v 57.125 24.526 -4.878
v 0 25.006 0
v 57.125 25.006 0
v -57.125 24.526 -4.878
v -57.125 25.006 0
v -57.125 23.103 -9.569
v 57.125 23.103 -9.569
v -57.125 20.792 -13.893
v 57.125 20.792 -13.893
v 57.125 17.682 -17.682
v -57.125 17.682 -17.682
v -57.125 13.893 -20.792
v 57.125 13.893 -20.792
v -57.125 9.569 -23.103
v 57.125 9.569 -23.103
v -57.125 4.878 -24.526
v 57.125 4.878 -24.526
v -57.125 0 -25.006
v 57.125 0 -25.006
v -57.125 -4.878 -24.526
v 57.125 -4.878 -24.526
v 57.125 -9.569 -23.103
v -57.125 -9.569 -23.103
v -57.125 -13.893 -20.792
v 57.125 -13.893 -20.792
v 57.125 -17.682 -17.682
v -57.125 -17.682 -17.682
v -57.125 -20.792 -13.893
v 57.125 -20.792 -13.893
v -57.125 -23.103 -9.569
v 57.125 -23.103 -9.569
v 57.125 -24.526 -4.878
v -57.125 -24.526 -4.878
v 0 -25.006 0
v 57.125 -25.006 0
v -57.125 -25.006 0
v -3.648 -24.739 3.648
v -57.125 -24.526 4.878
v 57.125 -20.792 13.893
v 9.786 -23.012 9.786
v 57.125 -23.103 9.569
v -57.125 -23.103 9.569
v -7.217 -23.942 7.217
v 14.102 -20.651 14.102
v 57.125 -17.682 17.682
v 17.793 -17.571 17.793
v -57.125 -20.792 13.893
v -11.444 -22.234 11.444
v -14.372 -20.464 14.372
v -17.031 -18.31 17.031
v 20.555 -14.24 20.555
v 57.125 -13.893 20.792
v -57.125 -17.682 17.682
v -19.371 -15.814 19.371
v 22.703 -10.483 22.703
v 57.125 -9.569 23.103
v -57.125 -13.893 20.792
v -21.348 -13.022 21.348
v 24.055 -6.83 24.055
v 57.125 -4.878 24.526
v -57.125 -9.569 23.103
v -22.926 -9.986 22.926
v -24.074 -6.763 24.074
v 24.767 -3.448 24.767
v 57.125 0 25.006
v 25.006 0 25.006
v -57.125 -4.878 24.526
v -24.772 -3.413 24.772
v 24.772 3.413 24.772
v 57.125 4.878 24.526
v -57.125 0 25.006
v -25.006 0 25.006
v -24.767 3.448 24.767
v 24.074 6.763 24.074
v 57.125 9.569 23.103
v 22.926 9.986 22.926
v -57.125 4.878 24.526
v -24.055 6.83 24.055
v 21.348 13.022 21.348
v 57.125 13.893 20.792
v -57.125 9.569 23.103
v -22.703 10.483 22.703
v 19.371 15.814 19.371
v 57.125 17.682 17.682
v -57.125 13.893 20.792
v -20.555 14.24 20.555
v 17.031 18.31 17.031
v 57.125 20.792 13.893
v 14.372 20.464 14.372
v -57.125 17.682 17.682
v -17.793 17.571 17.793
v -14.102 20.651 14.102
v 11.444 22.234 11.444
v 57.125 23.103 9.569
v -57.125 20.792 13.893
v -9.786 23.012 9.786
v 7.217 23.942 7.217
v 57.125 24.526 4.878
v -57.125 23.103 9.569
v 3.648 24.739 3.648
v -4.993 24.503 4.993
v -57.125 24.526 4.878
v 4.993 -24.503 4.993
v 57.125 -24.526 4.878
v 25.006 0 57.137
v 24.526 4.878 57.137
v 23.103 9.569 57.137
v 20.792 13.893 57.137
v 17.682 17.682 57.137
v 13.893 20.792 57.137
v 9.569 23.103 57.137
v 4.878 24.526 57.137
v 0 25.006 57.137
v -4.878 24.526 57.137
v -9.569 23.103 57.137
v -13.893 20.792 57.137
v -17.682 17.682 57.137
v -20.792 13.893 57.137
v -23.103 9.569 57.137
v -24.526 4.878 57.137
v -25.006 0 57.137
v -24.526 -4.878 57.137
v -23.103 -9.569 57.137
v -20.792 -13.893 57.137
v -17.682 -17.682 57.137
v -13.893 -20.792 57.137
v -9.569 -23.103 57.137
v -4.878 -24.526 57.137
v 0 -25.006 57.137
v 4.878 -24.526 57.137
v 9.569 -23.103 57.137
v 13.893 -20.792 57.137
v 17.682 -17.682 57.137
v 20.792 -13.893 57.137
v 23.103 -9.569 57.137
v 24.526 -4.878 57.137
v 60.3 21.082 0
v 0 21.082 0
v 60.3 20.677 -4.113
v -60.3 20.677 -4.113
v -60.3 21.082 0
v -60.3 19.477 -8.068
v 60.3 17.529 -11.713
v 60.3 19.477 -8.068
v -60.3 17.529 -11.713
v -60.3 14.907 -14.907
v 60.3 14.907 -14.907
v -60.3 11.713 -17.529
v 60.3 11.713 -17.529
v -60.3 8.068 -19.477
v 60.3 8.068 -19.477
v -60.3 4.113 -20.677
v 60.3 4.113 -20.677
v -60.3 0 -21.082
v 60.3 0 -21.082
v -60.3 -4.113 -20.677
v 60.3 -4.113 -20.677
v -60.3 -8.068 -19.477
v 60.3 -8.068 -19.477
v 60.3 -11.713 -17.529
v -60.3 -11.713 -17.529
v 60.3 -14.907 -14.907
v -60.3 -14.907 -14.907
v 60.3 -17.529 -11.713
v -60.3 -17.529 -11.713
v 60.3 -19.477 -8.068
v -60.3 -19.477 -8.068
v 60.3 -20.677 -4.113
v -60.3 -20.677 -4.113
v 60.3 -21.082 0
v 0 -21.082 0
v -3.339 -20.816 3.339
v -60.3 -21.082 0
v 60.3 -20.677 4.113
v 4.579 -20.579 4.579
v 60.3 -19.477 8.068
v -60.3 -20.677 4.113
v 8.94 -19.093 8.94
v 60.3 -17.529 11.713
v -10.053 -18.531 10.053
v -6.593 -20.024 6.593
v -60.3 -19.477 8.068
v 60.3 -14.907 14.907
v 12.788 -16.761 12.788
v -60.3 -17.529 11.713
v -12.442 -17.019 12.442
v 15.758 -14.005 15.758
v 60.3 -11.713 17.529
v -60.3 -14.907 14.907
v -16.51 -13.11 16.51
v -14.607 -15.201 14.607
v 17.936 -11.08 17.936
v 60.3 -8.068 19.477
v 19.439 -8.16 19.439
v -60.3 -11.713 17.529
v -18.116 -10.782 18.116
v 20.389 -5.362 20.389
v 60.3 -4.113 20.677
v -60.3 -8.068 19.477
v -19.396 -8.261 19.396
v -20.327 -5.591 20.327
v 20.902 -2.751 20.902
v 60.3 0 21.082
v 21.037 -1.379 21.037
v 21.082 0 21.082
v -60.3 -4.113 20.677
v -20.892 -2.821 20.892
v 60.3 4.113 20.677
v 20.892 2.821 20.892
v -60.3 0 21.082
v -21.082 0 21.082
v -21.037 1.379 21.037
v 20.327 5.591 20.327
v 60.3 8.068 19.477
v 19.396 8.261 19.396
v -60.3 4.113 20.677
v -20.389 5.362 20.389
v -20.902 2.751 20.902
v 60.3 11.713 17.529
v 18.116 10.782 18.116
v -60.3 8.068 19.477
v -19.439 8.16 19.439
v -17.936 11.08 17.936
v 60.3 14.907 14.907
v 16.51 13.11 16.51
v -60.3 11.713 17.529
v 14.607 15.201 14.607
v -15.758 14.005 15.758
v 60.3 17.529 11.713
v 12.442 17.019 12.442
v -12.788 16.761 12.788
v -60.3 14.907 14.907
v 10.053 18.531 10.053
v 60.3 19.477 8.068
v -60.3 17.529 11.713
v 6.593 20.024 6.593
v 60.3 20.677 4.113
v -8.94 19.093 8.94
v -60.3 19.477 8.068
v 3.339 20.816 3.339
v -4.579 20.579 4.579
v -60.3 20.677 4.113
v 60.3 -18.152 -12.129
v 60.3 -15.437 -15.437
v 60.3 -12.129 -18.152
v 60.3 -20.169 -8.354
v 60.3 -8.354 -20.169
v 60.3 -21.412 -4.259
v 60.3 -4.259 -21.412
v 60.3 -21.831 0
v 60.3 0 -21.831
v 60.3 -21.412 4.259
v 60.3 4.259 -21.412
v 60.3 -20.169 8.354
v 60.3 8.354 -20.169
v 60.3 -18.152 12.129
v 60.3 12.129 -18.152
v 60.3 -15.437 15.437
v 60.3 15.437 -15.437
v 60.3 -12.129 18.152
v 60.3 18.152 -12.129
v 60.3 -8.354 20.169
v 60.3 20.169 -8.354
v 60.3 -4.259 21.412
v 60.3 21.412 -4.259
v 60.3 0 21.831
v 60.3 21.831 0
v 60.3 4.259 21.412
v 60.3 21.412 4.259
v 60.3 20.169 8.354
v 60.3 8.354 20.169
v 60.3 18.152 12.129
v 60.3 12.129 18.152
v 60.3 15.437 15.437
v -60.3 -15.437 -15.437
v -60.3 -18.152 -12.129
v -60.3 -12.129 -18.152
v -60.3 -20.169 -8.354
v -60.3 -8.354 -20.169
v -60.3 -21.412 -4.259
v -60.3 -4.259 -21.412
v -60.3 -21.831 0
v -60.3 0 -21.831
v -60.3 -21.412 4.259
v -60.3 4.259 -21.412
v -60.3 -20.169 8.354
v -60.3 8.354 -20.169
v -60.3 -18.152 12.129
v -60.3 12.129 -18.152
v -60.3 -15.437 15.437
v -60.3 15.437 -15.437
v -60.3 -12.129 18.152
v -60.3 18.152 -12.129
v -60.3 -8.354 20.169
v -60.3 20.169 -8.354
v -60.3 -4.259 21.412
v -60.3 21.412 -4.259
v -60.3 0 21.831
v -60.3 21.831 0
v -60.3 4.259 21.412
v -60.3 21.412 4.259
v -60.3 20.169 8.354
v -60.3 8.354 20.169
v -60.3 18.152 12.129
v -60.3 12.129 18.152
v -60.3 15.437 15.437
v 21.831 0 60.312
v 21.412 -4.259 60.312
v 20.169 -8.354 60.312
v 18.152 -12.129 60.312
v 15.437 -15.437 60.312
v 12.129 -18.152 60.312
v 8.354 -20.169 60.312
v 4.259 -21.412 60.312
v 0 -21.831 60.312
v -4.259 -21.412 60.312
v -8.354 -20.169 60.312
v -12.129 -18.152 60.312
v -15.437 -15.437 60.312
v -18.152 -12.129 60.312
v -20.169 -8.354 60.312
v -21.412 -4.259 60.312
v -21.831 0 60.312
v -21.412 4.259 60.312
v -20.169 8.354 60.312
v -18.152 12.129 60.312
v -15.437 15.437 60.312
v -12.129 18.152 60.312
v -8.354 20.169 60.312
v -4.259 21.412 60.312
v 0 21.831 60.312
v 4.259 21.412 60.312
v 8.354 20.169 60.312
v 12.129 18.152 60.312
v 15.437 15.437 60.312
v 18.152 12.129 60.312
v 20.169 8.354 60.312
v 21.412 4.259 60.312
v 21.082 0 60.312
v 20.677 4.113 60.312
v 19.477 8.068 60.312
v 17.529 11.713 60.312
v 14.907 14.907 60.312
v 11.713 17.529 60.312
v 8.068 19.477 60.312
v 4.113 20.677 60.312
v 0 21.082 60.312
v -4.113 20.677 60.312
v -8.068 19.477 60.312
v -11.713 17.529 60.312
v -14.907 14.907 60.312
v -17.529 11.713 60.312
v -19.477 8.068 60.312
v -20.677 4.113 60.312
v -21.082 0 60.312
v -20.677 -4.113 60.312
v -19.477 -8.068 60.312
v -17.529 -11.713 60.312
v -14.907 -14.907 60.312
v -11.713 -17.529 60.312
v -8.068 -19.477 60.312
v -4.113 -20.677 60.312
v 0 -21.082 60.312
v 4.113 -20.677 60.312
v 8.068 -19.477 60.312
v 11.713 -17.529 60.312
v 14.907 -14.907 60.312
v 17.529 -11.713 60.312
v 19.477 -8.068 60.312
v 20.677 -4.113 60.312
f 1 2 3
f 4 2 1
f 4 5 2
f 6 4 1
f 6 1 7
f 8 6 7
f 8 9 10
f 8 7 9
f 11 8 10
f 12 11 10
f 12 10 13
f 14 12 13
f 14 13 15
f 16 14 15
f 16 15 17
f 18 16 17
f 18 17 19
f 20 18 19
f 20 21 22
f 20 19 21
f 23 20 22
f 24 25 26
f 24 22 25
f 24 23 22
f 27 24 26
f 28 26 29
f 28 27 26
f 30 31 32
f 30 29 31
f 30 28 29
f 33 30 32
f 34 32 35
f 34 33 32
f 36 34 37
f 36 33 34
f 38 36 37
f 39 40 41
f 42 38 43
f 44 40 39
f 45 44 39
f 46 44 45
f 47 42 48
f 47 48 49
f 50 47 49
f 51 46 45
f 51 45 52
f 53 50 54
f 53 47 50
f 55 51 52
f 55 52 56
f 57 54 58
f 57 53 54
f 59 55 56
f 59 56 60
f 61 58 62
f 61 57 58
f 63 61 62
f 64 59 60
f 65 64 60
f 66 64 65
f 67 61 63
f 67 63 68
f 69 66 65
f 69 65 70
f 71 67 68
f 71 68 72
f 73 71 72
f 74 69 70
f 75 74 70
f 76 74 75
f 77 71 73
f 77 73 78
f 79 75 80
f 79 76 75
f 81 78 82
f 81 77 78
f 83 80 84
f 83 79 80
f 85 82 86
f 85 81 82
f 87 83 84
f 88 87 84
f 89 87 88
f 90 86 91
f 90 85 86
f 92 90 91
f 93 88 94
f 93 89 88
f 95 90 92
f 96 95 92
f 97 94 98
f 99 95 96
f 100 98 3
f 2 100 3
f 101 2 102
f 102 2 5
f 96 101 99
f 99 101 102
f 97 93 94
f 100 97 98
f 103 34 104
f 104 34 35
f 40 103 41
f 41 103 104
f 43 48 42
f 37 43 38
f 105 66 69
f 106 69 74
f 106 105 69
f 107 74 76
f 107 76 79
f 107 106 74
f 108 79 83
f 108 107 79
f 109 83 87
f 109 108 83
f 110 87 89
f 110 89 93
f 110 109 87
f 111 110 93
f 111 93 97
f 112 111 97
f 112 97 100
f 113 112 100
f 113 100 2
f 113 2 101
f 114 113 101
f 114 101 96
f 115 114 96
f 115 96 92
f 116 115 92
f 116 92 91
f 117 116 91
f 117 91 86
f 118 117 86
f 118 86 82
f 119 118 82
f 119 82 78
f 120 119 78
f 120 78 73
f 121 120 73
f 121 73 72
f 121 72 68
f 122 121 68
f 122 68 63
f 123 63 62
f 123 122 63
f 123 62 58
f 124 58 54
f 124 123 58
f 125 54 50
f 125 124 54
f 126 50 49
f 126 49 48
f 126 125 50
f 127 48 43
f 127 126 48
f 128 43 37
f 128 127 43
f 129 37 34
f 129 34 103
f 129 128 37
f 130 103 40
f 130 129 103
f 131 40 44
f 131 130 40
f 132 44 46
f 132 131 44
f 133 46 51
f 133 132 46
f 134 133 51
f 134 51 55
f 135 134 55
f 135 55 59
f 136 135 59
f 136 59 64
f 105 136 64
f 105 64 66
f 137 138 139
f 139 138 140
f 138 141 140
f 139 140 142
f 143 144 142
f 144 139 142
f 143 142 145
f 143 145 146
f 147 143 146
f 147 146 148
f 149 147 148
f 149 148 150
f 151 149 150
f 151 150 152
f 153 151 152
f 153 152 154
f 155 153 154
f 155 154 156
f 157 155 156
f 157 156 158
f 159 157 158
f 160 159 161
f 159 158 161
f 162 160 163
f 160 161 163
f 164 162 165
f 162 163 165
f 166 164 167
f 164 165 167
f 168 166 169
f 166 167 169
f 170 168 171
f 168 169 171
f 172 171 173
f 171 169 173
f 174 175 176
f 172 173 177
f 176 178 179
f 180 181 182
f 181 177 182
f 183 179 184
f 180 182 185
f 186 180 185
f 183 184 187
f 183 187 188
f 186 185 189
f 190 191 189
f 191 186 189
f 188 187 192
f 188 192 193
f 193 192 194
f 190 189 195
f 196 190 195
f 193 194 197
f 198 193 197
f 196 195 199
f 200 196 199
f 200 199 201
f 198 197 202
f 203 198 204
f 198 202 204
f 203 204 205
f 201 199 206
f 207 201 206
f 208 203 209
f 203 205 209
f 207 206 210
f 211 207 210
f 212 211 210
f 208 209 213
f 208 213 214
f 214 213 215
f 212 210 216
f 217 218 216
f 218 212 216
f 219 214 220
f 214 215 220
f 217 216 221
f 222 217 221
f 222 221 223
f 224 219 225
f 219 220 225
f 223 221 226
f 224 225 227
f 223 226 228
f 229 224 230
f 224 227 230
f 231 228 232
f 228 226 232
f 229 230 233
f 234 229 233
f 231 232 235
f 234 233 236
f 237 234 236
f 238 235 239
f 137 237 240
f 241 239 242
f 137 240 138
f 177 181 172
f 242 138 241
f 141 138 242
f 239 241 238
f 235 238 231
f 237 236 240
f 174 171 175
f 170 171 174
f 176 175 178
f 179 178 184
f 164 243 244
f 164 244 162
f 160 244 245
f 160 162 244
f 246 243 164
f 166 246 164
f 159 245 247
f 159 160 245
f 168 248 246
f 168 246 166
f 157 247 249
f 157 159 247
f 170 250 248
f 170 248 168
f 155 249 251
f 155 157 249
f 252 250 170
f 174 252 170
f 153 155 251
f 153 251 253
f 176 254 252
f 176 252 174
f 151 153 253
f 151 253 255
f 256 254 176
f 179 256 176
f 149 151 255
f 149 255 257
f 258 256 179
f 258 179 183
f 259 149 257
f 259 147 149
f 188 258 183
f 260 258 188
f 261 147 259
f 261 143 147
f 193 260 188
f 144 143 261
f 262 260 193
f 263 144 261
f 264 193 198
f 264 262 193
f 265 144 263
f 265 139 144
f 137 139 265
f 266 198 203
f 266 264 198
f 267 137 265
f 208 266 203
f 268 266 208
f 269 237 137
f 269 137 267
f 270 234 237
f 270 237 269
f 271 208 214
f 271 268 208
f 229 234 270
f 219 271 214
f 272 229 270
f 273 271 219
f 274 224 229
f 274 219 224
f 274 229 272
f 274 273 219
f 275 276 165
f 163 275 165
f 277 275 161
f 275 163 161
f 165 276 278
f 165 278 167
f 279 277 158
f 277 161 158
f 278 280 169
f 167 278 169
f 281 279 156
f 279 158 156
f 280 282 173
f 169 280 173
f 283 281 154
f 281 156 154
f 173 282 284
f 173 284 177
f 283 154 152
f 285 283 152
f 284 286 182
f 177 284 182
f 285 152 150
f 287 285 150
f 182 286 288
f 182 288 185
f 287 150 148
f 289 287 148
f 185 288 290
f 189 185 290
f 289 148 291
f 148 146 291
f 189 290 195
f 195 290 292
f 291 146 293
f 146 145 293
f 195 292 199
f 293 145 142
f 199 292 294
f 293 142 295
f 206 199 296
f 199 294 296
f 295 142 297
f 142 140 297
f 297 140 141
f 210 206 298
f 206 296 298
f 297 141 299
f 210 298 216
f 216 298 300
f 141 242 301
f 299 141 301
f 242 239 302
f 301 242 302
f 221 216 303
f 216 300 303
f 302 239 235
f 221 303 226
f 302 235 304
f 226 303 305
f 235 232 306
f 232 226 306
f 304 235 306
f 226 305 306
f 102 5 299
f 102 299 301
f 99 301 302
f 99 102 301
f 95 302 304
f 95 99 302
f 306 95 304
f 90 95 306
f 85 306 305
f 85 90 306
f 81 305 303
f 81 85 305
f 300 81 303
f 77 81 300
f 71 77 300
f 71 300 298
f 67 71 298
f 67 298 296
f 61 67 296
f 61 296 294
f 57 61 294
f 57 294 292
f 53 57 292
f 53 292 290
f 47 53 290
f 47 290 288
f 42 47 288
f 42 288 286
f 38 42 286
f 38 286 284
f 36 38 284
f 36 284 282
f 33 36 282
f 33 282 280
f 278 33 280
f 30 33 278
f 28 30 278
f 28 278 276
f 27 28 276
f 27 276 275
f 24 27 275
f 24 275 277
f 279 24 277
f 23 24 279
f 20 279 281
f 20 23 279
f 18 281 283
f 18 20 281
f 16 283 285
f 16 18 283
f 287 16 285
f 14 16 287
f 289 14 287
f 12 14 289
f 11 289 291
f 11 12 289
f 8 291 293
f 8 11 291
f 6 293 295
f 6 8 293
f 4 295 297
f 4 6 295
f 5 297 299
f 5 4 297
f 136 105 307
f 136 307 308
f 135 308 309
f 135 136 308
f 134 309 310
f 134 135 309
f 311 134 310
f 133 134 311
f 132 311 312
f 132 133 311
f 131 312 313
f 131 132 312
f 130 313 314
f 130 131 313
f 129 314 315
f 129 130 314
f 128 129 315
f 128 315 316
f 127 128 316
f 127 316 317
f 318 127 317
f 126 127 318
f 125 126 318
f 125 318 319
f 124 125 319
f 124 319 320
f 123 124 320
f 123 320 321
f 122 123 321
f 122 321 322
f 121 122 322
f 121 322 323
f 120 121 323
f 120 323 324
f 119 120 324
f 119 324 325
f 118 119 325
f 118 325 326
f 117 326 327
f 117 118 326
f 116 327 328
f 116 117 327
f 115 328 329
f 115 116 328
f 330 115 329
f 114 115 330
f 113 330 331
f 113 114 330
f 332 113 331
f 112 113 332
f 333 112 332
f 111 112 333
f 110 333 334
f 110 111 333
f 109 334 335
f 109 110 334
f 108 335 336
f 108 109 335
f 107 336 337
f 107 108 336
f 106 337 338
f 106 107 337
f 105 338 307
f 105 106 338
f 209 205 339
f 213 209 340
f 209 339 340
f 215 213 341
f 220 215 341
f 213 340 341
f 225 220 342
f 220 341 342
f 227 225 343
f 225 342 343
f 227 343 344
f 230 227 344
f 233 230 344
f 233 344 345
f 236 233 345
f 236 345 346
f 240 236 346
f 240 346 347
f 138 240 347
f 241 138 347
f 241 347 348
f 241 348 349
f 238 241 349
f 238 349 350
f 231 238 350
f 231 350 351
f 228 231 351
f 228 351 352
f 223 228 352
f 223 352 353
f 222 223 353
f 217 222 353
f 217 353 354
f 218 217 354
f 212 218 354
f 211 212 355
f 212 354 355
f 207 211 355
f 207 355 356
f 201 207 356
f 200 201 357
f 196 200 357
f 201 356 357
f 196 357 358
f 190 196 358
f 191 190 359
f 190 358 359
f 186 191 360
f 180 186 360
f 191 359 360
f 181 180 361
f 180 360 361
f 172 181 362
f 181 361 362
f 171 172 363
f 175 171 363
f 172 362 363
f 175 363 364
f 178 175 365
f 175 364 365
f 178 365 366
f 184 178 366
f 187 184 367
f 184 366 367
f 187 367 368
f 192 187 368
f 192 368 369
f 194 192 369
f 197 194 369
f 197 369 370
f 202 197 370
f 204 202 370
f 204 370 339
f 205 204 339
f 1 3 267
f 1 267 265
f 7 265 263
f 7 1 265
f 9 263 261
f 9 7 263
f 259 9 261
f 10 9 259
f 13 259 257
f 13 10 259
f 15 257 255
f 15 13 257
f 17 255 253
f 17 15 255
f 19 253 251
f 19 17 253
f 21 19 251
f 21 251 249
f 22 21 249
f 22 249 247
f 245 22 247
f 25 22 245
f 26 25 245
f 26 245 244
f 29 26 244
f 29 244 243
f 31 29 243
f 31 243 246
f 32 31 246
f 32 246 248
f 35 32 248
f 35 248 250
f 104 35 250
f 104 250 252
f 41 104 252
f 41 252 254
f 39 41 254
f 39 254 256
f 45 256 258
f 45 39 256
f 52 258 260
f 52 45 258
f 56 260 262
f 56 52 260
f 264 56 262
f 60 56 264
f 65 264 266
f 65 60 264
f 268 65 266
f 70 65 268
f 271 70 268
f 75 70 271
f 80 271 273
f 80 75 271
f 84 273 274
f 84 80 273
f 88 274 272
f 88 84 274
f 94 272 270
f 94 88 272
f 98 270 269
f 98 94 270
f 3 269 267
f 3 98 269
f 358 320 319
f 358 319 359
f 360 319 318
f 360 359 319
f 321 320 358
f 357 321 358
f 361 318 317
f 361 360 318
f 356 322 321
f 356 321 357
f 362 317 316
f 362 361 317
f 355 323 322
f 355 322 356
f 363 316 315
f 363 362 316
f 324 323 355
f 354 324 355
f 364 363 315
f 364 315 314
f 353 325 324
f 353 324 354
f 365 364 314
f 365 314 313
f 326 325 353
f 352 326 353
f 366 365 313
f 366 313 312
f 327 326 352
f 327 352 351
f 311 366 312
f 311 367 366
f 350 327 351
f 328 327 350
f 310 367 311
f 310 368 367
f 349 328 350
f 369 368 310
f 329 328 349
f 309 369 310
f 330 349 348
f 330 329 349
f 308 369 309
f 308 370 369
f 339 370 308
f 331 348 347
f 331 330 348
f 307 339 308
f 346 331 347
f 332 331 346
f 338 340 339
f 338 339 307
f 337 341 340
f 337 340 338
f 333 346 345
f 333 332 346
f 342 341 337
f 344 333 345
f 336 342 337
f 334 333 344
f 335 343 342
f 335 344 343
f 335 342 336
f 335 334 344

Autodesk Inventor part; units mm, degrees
ref_plane "YZ Plane" through (0, 0, 0) normal (1, 0, 0) x (0, 1, 0)
ref_plane "XZ Plane" through (0, 0, 0) normal (0, 1, 0) x (-1, 0, 0)
sketch "Sketch1" plane through (0, 0, 0) normal (1, 0, 0) x (0, 1, 0)
  circle A0 centre (0, 0) radius 21.082
  circle A1 centre (0, 0) radius 25.0063
  dimension "d0" = 42.164
  dimension "d1" = 50.0126
extrude "Extrusion1" add sketch "Sketch1" along normal mid plane 120.5992
ref_plane "Work Plane1" through (0, 0, 60.3123) normal (0, 0, 1) x (1, 0, 0)
sketch "Sketch2" plane through (0, 0, 60.3123) normal (0, 0, 1) x (1, 0, 0)
  circle A0 centre (0, 0) radius 25.0063
  circle A1 centre (0, 0) radius 21.082
  dimension "d5" = 50.0126
  dimension "d6" = 42.164
extrude "Extrusion2" add sketch "Sketch2" against normal up to next
sketch "Sketch3" plane through (0, 0, 60.3123) normal (0, 0, 1) x (1, 0, 0)
  circle A0 centre (0, 0) radius 21.082 projected
extrude "Extrusion3" cut sketch "Sketch3" against normal up to next
chamfer "Chamfer1" distance 3.175 angle 45 3 edges at (-60.2996, -25.0063, 0) (-25.0063, 0, 60.3123) (60.2996, -25.0063, 0)
properties part number "Tee 1.25 IN D" material "PVC-Piping"
